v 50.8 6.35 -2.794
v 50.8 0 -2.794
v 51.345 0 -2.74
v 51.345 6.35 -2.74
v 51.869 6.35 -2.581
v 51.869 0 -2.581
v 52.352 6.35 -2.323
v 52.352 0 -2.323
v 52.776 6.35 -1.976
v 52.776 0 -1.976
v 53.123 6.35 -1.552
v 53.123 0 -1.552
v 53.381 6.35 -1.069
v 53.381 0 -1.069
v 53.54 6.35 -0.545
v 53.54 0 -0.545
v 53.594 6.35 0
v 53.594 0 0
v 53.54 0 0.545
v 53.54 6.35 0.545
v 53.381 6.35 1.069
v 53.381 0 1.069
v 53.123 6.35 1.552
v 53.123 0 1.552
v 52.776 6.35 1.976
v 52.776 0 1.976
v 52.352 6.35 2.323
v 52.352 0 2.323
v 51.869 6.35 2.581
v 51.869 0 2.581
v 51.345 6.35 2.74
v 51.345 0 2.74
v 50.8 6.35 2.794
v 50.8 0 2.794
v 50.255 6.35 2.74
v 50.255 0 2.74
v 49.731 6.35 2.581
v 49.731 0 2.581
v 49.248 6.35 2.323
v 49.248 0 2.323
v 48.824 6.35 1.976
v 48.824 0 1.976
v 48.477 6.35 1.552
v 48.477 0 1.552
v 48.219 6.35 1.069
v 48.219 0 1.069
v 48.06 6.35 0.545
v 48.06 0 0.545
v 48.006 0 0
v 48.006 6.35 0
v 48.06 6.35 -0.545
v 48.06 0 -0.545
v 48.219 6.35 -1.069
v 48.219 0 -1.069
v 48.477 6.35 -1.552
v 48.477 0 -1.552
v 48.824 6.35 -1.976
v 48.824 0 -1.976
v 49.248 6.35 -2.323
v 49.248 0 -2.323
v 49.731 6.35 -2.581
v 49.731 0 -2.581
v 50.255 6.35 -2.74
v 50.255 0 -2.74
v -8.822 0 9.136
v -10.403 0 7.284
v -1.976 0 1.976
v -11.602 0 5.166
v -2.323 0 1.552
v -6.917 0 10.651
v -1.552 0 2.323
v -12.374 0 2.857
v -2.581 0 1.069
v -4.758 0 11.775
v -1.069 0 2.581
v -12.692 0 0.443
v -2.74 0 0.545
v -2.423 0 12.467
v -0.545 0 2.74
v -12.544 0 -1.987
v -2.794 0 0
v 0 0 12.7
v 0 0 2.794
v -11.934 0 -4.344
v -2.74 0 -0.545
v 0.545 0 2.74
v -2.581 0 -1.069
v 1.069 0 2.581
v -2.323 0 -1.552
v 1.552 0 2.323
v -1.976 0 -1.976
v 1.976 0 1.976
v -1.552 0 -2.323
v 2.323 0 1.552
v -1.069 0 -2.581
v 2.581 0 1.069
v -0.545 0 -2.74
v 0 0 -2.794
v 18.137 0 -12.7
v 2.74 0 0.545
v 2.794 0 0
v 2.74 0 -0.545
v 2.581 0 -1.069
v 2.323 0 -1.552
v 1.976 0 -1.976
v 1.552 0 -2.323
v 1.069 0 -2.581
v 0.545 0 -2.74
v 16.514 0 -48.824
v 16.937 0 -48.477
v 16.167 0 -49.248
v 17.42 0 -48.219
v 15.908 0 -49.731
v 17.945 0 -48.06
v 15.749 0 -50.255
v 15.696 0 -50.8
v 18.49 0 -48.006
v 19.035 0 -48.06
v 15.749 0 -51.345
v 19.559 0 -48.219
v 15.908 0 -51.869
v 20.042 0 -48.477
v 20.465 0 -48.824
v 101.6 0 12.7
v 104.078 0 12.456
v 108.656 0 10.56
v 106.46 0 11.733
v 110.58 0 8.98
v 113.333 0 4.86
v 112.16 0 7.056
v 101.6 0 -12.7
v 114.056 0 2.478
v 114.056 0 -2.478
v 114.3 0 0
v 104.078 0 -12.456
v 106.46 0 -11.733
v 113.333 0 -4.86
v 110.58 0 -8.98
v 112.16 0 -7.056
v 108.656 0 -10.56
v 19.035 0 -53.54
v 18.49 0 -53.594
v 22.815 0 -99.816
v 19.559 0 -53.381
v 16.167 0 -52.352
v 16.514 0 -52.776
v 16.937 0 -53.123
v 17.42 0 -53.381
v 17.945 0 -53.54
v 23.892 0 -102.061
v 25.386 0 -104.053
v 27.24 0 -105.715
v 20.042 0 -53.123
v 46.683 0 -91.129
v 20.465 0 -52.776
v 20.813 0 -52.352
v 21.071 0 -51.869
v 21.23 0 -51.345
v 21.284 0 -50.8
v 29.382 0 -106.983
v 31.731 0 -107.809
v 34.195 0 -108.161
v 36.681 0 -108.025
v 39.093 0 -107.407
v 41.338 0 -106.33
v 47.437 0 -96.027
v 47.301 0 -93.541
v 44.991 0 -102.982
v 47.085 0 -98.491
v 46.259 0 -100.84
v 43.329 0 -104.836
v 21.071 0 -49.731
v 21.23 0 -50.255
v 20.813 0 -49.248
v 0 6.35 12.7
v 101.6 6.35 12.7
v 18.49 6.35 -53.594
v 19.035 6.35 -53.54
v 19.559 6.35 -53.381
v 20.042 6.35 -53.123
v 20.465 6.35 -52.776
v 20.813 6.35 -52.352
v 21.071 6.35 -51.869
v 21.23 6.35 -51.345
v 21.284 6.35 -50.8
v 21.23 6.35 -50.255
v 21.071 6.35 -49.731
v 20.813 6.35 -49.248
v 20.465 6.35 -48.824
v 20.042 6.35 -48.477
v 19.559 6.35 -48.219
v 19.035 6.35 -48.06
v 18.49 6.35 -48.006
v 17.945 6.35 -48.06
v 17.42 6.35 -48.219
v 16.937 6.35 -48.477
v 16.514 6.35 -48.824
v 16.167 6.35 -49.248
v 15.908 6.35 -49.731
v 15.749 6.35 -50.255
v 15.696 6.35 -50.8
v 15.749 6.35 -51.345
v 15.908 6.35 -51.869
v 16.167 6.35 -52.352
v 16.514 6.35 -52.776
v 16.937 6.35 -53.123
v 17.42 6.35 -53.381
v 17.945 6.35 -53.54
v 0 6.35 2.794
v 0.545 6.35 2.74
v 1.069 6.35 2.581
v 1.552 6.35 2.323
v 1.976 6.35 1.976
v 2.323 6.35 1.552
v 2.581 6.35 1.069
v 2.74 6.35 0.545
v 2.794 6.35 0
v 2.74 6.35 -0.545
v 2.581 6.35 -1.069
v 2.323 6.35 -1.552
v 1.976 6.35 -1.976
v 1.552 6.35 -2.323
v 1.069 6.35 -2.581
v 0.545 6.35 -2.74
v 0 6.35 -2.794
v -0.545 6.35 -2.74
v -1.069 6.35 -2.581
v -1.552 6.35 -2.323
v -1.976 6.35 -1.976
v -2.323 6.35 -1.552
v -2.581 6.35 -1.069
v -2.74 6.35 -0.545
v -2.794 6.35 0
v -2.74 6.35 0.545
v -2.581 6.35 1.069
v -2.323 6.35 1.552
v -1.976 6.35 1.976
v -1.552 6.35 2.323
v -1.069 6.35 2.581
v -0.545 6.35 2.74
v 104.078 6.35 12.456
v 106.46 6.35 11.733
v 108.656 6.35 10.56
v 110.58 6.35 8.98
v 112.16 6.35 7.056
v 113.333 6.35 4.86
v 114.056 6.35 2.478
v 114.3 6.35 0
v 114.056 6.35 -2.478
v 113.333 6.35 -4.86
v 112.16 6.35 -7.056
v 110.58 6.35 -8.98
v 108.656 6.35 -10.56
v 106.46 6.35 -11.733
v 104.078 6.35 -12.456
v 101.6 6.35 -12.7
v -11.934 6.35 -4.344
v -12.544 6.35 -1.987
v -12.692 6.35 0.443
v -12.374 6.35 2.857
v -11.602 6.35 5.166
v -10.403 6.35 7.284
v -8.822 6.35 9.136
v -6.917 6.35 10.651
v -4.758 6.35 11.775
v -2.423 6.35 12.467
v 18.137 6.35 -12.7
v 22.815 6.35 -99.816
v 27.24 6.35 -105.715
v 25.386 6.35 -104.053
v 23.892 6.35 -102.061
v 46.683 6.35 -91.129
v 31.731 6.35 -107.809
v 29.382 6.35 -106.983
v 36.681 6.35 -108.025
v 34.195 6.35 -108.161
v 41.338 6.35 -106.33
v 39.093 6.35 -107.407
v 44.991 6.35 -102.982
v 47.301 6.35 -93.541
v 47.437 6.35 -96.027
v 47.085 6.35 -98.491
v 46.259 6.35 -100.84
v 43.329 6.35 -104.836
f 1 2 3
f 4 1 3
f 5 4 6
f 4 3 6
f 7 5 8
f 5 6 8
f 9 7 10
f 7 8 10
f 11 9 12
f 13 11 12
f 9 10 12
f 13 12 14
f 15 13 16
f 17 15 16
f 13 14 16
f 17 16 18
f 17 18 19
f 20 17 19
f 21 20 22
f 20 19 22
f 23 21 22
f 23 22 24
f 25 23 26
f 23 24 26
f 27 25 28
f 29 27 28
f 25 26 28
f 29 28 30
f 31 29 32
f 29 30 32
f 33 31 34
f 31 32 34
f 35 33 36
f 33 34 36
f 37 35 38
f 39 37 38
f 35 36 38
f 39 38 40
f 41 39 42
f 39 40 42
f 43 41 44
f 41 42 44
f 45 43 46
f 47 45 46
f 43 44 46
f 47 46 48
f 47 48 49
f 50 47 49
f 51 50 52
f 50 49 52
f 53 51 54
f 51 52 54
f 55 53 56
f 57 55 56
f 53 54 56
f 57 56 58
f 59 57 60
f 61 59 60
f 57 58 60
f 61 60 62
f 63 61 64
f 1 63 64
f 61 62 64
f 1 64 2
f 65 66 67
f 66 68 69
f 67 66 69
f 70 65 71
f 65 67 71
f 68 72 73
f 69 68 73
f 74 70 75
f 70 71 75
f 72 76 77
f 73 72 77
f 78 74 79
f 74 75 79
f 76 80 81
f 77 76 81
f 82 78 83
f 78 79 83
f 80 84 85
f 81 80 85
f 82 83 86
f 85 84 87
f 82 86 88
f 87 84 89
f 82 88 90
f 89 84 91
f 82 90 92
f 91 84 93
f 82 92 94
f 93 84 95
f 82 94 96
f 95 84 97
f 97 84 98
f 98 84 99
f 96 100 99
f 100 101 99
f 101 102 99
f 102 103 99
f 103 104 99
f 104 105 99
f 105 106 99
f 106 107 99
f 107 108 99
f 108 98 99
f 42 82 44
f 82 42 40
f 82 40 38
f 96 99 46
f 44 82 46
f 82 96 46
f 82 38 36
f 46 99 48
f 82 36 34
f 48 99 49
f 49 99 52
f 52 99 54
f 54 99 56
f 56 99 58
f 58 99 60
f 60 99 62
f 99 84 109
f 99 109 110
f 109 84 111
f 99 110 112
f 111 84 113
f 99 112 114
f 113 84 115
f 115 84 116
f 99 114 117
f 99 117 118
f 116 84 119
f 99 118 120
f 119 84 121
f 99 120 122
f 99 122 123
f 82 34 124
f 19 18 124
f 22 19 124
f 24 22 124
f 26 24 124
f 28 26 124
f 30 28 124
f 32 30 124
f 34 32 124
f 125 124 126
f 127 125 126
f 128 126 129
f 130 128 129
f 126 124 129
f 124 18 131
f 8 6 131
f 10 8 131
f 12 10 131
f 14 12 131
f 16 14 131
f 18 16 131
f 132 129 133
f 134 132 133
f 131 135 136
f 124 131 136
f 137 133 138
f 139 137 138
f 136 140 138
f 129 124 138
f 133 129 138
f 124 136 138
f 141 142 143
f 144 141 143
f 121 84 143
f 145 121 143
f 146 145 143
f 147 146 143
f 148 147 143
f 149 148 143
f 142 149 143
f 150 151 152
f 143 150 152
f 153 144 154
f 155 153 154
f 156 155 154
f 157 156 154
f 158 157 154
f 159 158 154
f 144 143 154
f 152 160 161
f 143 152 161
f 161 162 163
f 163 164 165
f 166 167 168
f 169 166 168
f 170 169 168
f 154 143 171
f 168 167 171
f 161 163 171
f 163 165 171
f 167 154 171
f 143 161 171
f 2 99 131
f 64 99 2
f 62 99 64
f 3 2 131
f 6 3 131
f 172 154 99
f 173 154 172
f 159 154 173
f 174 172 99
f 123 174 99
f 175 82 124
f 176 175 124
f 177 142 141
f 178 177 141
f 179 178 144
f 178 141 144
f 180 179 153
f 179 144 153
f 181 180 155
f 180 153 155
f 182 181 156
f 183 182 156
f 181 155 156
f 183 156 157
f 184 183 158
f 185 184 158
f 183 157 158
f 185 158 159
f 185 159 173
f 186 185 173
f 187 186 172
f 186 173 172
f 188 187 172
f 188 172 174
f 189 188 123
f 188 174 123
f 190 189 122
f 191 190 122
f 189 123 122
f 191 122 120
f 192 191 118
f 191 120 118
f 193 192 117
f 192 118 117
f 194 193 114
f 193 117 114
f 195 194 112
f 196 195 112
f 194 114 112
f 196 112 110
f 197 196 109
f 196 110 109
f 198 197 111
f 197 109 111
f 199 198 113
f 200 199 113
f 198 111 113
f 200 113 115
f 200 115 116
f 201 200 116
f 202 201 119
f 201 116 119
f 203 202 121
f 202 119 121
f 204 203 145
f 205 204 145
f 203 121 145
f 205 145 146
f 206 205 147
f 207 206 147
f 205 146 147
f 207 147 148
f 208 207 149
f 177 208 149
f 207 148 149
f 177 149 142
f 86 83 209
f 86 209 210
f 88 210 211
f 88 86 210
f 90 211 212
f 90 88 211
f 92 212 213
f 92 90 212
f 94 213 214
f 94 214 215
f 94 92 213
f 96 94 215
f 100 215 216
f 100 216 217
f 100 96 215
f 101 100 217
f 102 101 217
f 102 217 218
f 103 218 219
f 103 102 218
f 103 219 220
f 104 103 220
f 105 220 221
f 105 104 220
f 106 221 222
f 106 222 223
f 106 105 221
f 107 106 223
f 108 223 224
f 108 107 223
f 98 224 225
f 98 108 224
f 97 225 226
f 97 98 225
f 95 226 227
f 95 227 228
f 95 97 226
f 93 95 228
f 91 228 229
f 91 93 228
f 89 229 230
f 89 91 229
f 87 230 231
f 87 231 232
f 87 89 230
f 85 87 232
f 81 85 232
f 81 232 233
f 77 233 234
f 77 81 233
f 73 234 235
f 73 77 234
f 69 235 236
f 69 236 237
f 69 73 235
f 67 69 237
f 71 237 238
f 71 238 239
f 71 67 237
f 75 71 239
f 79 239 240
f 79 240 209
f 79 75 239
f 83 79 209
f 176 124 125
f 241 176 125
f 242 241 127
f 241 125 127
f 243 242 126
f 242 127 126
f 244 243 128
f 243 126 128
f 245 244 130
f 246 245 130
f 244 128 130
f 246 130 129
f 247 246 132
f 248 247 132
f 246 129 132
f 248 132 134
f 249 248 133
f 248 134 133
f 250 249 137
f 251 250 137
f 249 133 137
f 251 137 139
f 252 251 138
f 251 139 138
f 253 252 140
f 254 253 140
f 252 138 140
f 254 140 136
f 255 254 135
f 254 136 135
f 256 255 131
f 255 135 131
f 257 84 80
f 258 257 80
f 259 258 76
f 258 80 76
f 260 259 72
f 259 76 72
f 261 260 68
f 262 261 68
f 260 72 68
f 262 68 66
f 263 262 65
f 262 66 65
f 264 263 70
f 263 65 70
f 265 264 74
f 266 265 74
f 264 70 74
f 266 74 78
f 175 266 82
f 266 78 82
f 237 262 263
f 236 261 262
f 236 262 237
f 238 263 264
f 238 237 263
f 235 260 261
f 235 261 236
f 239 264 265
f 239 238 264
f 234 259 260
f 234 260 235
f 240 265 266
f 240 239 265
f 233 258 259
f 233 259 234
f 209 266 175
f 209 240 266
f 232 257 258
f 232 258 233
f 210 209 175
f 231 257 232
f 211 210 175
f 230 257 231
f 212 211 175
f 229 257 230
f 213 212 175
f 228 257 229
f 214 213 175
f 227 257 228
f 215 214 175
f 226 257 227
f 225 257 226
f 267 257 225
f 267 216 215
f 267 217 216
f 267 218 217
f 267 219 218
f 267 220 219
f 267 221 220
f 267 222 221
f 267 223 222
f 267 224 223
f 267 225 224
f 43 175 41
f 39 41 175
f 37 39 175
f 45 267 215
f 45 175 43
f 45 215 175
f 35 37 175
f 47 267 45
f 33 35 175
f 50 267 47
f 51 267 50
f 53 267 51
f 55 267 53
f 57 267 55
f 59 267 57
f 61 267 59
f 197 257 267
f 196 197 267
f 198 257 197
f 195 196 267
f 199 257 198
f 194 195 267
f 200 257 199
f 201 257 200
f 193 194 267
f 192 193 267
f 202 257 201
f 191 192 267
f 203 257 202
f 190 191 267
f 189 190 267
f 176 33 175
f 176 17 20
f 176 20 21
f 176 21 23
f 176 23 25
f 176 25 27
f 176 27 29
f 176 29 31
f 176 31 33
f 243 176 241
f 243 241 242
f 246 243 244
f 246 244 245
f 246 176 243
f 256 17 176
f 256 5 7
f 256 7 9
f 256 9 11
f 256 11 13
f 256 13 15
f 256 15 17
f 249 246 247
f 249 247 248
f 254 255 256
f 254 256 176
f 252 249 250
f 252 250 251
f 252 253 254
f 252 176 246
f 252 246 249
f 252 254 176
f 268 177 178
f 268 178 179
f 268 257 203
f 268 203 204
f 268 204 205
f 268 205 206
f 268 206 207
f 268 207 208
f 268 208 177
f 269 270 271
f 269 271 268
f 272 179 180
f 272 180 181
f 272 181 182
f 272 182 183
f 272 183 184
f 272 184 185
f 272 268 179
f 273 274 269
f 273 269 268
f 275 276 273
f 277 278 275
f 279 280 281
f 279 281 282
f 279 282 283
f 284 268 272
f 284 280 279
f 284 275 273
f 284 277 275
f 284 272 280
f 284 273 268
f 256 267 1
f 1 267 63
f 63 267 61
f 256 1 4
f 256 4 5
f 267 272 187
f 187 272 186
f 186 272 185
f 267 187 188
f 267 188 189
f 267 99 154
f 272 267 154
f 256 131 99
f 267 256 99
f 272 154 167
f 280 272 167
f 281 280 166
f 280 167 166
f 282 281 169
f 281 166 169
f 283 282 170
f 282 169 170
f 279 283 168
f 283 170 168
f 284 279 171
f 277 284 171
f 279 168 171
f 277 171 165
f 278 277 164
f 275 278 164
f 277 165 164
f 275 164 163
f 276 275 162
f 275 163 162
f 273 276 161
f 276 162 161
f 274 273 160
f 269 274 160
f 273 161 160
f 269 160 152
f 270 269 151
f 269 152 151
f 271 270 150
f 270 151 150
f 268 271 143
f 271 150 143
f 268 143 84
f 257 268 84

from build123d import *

# Parameters (mm, degrees)
SKETCH5_R            = 2.794
BOSS_EXTRUDE21_DEPTH = 6.35
SKETCH6_R            = 2.794
CUT_EXTRUDE3_DEPTH   = 6.35


with BuildPart() as part:
    # Sketch5 → Boss-Extrude21 (new body)
    # profile 1 of 3: a face of its own
    with BuildSketch(Plane(origin=(0, 0, 0), x_dir=(1, 0, 0), z_dir=(0, 1, 0))):
        with BuildLine():
            Line((101.6, 12.7), (18.137479686, 12.7))
            Line((18.137479686, 12.7), (11.934096284, -4.34365582))
            ThreePointArc((11.934096284, -4.34365582), (7.284420742, -10.403230962), (0, -12.7))
            Line((0, -12.7), (101.6, -12.7))
            ThreePointArc((101.6, -12.7), (114.3, 0), (101.6, 12.7))
        make_face()
    # profile 2 of 3: a face of its own
    with BuildSketch(Plane(origin=(0, 0, 0), x_dir=(1, 0, 0), z_dir=(0, 1, 0))):
        with BuildLine():
            ThreePointArc((-11.934096284, 4.34365582), (-7.284420742, 10.403230962), (0, 12.7))
            Line((0, 12.7), (18.137479686, 12.7))
            Line((18.137479686, 12.7), (46.683342846, 91.129114452))
            ThreePointArc((46.683342846, 91.129114452), (39.092902382, 107.406866556), (22.815150278, 99.816426092))
            Line((22.815150278, 99.816426092), (-11.934096284, 4.34365582))
        make_face()
    # profile 3 of 3: a face of its own
    with BuildSketch(Plane(origin=(0, 0, 0), x_dir=(1, 0, 0), z_dir=(0, 1, 0))):
        with BuildLine():
            Line((18.137479686, 12.7), (0, 12.7))
            ThreePointArc((0, 12.7), (-7.284420742, 10.403230962), (-11.934096284, 4.34365582))
            ThreePointArc((-11.934096284, 4.34365582), (-10.403230962, -7.284420742), (0, -12.7))
            ThreePointArc((0, -12.7), (7.284420742, -10.403230962), (11.934096284, -4.34365582))
            Line((11.934096284, -4.34365582), (18.137479686, 12.7))
        make_face()
        with Locations(Location((0, 0, 0), (0, 0, 270))):
            Circle(SKETCH5_R, mode=Mode.SUBTRACT)
    extrude(amount=BOSS_EXTRUDE21_DEPTH)

    # Sketch6 → Cut-Extrude3 (cut)
    with BuildSketch(Plane(origin=(0, 0, 0), x_dir=(-1, 0, 0), z_dir=(0, -1, 0))):
        with Locations(Location((-50.8, 0, 0), (0, 0, 90))):
            Circle(SKETCH6_R)
        with Locations(Location((-18.489687901, 50.8, 0), (0, 0, 90))):
            Circle(SKETCH6_R)
    extrude(amount=-CUT_EXTRUDE3_DEPTH, mode=Mode.SUBTRACT)


solid = part.part
